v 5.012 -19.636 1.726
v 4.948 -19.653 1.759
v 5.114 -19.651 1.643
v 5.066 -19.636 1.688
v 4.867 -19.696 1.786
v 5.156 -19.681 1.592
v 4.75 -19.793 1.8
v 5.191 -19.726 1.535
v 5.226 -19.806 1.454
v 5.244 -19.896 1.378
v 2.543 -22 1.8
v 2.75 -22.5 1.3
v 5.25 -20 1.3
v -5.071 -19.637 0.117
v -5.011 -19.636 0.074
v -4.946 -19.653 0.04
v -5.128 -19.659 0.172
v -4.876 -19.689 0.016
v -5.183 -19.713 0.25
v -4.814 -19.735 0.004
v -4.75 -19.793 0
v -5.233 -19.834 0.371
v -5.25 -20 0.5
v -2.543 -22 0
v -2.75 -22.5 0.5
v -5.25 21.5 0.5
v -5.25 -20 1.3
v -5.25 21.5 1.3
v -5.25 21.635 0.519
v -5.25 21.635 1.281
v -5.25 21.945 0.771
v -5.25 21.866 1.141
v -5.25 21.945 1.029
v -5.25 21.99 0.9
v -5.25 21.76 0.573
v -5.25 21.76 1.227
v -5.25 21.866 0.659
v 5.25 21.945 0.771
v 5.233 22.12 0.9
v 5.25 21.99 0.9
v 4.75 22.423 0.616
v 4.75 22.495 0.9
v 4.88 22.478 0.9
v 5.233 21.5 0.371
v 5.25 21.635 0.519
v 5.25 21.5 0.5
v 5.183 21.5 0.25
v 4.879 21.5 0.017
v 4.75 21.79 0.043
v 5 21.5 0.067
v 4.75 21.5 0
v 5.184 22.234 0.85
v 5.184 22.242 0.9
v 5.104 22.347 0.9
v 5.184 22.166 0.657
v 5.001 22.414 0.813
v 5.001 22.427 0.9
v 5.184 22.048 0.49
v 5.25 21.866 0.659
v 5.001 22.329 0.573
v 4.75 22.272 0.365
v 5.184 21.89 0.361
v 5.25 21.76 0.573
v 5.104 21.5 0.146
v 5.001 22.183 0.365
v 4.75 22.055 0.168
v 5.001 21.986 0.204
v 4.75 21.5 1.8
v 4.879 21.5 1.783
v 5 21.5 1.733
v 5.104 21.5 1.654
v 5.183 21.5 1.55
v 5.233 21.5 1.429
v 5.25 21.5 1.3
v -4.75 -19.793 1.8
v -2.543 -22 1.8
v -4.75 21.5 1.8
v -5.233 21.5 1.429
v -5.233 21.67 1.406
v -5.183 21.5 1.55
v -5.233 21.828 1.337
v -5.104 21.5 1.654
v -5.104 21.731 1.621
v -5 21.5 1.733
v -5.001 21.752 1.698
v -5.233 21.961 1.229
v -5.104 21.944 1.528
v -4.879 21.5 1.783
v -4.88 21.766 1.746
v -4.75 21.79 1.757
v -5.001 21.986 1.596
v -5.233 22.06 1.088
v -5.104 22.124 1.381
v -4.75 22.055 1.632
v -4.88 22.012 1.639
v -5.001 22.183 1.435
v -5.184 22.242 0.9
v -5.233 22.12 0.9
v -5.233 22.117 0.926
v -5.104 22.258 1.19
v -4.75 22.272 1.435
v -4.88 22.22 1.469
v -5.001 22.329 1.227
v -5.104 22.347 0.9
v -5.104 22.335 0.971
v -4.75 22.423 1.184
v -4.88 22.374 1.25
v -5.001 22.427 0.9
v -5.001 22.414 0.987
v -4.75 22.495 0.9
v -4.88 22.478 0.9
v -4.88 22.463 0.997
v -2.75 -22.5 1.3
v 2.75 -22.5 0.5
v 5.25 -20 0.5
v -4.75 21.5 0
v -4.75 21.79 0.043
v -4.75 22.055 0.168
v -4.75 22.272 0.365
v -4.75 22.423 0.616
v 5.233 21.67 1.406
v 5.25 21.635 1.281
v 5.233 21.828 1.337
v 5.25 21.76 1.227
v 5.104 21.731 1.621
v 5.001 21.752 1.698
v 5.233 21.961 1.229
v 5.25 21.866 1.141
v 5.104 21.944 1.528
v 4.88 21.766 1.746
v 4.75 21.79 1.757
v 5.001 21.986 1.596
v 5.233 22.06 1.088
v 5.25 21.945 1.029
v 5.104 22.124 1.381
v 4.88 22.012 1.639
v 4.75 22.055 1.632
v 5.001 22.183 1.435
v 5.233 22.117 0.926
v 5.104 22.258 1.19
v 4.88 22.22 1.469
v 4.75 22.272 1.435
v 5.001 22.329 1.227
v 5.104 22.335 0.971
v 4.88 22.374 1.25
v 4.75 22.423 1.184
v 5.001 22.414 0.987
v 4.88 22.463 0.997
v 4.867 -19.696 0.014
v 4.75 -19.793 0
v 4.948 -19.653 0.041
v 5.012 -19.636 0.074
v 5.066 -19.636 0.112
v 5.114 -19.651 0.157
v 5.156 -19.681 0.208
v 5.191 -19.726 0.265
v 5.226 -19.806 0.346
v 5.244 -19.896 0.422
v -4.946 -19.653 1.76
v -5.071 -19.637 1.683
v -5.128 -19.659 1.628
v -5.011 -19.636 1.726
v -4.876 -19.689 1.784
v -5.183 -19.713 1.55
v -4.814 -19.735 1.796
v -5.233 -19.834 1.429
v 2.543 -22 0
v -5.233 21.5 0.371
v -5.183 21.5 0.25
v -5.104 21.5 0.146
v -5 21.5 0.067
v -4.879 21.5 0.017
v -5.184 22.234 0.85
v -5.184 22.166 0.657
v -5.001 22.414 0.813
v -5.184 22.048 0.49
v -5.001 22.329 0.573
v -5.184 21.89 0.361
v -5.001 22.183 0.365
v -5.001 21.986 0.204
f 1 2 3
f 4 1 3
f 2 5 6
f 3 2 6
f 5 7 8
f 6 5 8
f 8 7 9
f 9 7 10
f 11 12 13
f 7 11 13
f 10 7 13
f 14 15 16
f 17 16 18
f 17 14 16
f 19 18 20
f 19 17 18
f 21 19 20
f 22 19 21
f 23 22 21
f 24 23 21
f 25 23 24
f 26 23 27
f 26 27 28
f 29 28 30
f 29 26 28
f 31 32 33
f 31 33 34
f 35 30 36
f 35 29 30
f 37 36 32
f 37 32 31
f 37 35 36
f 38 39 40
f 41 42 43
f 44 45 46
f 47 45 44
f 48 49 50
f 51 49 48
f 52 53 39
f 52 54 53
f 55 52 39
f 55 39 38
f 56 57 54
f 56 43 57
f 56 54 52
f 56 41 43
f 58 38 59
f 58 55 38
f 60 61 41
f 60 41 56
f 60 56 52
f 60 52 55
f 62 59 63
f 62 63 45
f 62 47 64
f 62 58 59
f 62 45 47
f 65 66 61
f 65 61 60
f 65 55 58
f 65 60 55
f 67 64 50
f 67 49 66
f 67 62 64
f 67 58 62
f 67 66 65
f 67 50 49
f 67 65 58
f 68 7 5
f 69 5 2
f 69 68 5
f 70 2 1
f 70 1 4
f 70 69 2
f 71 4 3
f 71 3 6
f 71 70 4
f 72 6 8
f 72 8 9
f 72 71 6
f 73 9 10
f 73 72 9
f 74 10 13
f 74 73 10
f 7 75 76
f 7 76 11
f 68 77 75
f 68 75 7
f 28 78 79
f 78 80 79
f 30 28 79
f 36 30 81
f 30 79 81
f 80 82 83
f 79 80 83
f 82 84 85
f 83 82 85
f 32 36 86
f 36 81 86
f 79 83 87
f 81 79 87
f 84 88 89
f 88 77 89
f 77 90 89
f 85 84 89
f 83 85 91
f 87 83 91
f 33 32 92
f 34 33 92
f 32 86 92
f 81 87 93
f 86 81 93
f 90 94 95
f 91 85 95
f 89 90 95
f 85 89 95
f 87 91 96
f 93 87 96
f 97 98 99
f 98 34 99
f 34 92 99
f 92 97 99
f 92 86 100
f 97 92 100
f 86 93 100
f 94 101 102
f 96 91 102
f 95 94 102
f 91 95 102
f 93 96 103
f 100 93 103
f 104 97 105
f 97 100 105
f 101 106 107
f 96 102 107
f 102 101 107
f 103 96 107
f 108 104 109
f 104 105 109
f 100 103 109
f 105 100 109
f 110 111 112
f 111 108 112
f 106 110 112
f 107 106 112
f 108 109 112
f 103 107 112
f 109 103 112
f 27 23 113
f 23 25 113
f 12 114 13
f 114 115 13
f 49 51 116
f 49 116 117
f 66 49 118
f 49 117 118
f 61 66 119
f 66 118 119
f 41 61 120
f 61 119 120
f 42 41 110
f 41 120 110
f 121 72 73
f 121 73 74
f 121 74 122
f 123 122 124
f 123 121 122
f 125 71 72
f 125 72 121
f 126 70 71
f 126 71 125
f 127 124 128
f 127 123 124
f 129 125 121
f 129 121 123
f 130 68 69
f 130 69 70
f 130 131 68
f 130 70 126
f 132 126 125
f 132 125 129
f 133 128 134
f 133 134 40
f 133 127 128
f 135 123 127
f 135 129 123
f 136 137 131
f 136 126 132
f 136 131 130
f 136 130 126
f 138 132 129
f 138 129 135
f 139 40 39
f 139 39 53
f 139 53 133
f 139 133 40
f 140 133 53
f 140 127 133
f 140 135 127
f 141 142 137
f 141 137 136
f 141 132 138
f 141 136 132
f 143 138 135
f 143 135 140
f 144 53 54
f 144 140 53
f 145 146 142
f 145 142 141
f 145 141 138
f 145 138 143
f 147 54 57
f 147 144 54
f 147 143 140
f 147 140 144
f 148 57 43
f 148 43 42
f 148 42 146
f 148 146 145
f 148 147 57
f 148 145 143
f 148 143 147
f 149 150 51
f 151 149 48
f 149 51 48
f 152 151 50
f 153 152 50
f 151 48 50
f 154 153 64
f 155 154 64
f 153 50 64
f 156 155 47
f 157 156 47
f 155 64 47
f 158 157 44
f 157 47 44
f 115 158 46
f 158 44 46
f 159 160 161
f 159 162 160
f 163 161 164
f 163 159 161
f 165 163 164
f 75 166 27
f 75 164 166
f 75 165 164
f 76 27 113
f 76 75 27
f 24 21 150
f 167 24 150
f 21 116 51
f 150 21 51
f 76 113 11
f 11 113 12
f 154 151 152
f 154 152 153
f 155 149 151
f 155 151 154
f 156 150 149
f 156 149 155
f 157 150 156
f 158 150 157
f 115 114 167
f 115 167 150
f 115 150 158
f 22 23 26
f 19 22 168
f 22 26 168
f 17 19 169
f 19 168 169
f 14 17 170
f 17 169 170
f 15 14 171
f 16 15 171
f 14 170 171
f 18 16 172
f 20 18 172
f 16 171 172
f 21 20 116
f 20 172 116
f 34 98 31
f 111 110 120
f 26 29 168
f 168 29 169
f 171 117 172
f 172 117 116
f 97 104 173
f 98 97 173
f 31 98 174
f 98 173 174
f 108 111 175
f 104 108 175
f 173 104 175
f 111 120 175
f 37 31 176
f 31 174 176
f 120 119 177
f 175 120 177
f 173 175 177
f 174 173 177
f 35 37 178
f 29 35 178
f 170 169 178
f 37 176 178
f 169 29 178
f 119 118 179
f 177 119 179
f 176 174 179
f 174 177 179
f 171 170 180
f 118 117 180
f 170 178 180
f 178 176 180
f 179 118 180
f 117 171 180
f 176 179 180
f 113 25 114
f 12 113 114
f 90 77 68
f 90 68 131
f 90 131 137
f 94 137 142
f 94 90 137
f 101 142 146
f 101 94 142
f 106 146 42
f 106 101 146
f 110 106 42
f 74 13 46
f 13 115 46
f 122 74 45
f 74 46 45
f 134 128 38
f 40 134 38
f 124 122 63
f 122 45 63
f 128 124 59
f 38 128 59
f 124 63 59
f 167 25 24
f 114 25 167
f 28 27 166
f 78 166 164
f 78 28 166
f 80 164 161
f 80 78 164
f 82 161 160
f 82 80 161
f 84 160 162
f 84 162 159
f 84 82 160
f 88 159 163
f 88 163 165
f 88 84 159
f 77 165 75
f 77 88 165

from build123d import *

# Parameters (mm, degrees)
F0_W         = 10.5
F0_H         = 45
F1_DEPTH     = 1.8
F2_SIZE      = 2.5
F3_SIZE      = 0.5
F4_T1_DEPTH  = 15.5
F5_T1_DEPTH  = 42.0428932188
F5_T4_ANGLE  = 155.9057709944
F5_T6_ANGLE  = 155.9057709944
F5_T8_ANGLE  = 155.9057709944
F5_T10_ANGLE = 155.9057709944


# Not quite as in the source:
# - a fillet or chamfer that OpenCascade refuses, or shapes differently, is made with other operations: its cross-section is extruded or revolved along the edge and cut away or added


with BuildPart() as f1:
    # F0 (on Top) → F1 (new body)
    with BuildSketch(Plane.XY):
        Rectangle(F0_W, F0_H)
    extrude(amount=F1_DEPTH)

    # F2
    f2_edges = [f1.edges().sort_by_distance(p)[0] for p in [
        (5.25, -22.5, 0.9),
        (-5.25, -22.5, 0.9),
    ]]
    chamfer(f2_edges, length=F2_SIZE)

    # F3
    f3_edges = [f1.edges().sort_by_distance(p)[0] for p in [
        (0, -22.5, 1.8),
        (4, -21.25, 1.8),
        (4, -21.25, 0),
        (0, -22.5, 0),
        (-4, -21.25, 1.8),
        (-4, -21.25, 0),
    ]]
    chamfer(f3_edges, length=F3_SIZE)

    # F4: fillet of radius 1 on 2 edges, made by hand

    # F4_s2 → F4_t1 (cut)
    with BuildSketch(Plane.YZ.offset(-7.75)):
        with BuildLine():
            ThreePointArc((21.5, 0), (22.2071067812, 0.2928932188), (22.5, 1))
            Line((22.5, 1), (22.5, 0))
            Line((22.5, 0), (21.5, 0))
        make_face()
        with BuildLine():
            ThreePointArc((21.5, 1.8), (22.2071067812, 1.5071067812), (22.5, 0.8))
            Line((22.5, 0.8), (22.5, 1.8))
            Line((22.5, 1.8), (21.5, 1.8))
        make_face()
    extrude(amount=F4_T1_DEPTH, mode=Mode.SUBTRACT)

    # F5: fillet of radius 0.5 on 8 edges, made by hand

    # F5_s2 → F5_t1 (cut)
    with BuildSketch(Plane.XZ.offset(-21.5)):
        with BuildLine():
            ThreePointArc((4.75, 1.8), (5.1035533906, 1.6535533906), (5.25, 1.3))
            Line((5.25, 1.3), (5.25, 1.8))
            Line((5.25, 1.8), (4.75, 1.8))
        make_face()
        with BuildLine():
            ThreePointArc((4.75, 0), (5.1035533906, 0.1464466094), (5.25, 0.5))
            Line((5.25, 0.5), (5.25, 0))
            Line((5.25, 0), (4.75, 0))
        make_face()
        with BuildLine():
            ThreePointArc((-5.25, 1.3), (-5.1035533906, 1.6535533906), (-4.75, 1.8))
            Line((-4.75, 1.8), (-5.25, 1.8))
            Line((-5.25, 1.8), (-5.25, 1.3))
        make_face()
        with BuildLine():
            ThreePointArc((-5.25, 0.5), (-5.1035533906, 0.1464466094), (-4.75, 0))
            Line((-4.75, 0), (-5.25, 0))
            Line((-5.25, 0), (-5.25, 0.5))
        make_face()
    extrude(amount=F5_T1_DEPTH, mode=Mode.SUBTRACT)

    # F5_s3 → F5_t4 (revolve, cut)
    with BuildSketch(Plane.XZ.offset(-21.5)):
        with BuildLine():
            ThreePointArc((-5.25, 1.3), (-5.1035533906, 1.6535533906), (-4.75, 1.8))
            Line((-4.75, 1.8), (-5.25, 1.8))
            Line((-5.25, 1.8), (-5.25, 1.3))
        make_face()
    revolve(axis=Axis((-5.25, 21.5, 0.8), (-1, 0, 0)), revolution_arc=F5_T4_ANGLE, mode=Mode.SUBTRACT)

    # F5_s5 → F5_t6 (revolve, cut)
    with BuildSketch(Plane(origin=(0, 17.5441674109, -7.8457647459), x_dir=(1, 0, 0), z_dir=(0, -0.9128753008, 0.4082385151))):
        with BuildLine():
            ThreePointArc((-5.25, 10.1900033752), (-5.1035533906, 10.5435567657), (-4.75, 10.6900033752))
            Line((-4.75, 10.6900033752), (-5.25, 10.6900033752))
            Line((-5.25, 10.6900033752), (-5.25, 10.1900033752))
        make_face()
    revolve(axis=Axis((-5.25, 21.5, 1), (-1, 0, 0)), revolution_arc=F5_T6_ANGLE, mode=Mode.SUBTRACT)

    # F5_s7 → F5_t8 (revolve, cut)
    with BuildSketch(Plane(origin=(0, 17.5441674109, -7.8457647459), x_dir=(1, 0, 0), z_dir=(0, -0.9128753008, 0.4082385151))):
        with BuildLine():
            ThreePointArc((5.25, 10.1900033752), (5.1035533906, 10.5435567657), (4.75, 10.6900033752))
            Line((4.75, 10.6900033752), (5.25, 10.6900033752))
            Line((5.25, 10.6900033752), (5.25, 10.1900033752))
        make_face()
    revolve(axis=Axis((5.25, 21.5, 1), (-1, 0, 0)), revolution_arc=F5_T8_ANGLE, mode=Mode.SUBTRACT)

    # F5_s9 → F5_t10 (revolve, cut)
    with BuildSketch(Plane.XZ.offset(-21.5)):
        with BuildLine():
            ThreePointArc((5.25, 1.3), (5.1035533906, 1.6535533906), (4.75, 1.8))
            Line((4.75, 1.8), (5.25, 1.8))
            Line((5.25, 1.8), (5.25, 1.3))
        make_face()
    revolve(axis=Axis((5.25, 21.5, 0.8), (-1, 0, 0)), revolution_arc=F5_T10_ANGLE, mode=Mode.SUBTRACT)


solid = f1.part
